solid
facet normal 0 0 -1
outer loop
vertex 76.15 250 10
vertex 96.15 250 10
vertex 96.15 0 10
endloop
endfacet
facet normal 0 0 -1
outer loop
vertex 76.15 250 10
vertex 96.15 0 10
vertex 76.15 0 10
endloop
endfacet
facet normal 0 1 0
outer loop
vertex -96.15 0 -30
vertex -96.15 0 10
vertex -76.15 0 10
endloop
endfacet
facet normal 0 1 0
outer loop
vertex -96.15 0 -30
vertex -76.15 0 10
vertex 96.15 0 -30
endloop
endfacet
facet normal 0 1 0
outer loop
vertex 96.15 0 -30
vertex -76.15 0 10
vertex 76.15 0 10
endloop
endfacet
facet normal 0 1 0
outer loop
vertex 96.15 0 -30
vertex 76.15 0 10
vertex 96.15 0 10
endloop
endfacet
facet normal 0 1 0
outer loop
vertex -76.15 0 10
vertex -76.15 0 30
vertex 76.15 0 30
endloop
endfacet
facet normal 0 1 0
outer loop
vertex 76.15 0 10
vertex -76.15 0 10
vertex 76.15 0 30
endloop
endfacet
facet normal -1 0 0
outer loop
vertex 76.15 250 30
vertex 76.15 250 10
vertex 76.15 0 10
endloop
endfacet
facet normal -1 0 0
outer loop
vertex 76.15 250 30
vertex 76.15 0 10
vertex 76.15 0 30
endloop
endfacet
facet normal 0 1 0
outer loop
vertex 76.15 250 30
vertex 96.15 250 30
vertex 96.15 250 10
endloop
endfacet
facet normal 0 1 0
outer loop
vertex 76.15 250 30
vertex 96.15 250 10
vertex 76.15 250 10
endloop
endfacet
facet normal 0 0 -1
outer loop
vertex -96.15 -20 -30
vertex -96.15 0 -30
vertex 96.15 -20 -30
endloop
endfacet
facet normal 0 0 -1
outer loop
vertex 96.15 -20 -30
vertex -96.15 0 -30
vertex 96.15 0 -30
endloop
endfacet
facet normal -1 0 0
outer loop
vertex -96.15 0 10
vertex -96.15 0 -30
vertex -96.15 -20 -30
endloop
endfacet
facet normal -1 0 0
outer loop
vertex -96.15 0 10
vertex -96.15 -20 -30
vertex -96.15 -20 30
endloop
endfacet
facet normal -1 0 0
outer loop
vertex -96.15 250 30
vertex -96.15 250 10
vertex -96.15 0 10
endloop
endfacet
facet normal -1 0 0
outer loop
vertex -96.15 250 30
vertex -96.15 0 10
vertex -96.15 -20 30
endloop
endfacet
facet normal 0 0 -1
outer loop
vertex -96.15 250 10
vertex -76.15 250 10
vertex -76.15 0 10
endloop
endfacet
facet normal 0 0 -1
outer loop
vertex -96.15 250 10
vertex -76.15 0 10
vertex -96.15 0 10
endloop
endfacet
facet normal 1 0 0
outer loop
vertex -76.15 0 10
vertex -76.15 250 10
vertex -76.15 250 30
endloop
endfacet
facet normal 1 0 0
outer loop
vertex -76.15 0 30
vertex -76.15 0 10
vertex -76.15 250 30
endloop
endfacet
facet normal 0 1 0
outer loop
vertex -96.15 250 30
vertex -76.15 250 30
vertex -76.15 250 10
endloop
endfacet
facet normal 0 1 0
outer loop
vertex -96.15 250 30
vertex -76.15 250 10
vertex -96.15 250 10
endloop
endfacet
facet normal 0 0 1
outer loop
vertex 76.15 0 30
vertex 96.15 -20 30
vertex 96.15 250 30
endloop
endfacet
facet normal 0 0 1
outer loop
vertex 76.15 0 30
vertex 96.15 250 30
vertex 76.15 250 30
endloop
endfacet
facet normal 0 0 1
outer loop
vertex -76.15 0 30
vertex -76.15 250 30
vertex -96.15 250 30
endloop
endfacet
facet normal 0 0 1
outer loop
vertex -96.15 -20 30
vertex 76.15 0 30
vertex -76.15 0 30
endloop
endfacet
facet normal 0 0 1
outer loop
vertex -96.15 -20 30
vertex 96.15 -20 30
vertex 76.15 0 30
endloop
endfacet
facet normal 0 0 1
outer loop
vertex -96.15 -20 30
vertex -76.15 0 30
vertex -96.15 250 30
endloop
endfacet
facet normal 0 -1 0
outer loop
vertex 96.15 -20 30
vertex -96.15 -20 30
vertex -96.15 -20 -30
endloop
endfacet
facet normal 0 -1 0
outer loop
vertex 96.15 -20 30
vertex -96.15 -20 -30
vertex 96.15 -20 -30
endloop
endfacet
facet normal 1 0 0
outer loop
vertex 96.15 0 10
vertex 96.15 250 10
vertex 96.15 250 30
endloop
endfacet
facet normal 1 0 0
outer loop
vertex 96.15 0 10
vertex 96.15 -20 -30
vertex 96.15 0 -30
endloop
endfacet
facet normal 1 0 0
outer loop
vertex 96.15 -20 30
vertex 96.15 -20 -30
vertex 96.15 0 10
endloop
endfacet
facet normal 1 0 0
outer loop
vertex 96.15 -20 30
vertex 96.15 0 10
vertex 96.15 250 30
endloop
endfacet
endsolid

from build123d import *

# Parameters (mm, degrees)
F0_W     = 192.3
F0_H     = 60
F1_DEPTH = 20
F2_W     = 20
F2_H     = 20
F3_DEPTH = 250


with BuildPart() as f1:
    # F0 (on Front) → F1 (new body)
    with BuildSketch(Plane.XZ):
        Rectangle(F0_W, F0_H)
    extrude(amount=F1_DEPTH)

    # F2 (on face) → F3 (join)
    with BuildSketch(Plane(origin=(0, 0, 0), x_dir=(-1, 0, 0), z_dir=(0, 1, 0))):
        with Locations((-86.15, 20)):
            Rectangle(F2_W, F2_H)
        with Locations((86.15, 20)):
            Rectangle(F2_W, F2_H)
    extrude(amount=F3_DEPTH)


solid = f1.part
